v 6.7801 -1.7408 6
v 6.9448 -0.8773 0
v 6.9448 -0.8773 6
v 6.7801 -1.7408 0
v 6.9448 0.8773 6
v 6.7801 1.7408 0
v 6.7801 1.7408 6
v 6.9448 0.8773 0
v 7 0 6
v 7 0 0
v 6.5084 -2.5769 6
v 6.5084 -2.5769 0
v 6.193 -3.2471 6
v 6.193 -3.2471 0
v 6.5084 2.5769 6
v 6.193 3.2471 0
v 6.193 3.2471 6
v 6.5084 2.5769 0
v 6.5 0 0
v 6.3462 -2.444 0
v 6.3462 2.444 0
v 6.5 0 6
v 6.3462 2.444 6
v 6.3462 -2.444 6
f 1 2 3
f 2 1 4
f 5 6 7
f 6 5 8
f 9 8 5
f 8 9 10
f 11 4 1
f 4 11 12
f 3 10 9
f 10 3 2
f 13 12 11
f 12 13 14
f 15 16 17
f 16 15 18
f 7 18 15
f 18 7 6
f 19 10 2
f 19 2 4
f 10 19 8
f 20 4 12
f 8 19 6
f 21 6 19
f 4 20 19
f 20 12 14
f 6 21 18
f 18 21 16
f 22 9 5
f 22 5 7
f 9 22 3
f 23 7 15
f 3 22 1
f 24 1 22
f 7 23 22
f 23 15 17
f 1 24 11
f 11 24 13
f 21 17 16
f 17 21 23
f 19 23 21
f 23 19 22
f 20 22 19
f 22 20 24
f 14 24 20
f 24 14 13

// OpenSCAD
$fn = 50;


difference() {
	union() {
		cylinder(h = 6, r = 7.0000000000);
		translate(v = [-16.0000000000, 0, 0]) {
			cylinder(h = 6, r = 7.0000000000);
		}
	}
	union() {
		cylinder(h = 6, r = 3.2500000000);
		cylinder(h = 6, r = 1.8000000000);
		cylinder(h = 6, r = 1.8000000000);
		cylinder(h = 6, r = 1.8000000000);
		translate(v = [-20.5000000000, 0, 0]) {
			hull() {
				translate(v = [-3.7500000000, 0.0000000000, 0]) {
					cylinder(h = 6, r = 10.5000000000);
				}
				translate(v = [3.7500000000, 0.0000000000, 0]) {
					cylinder(h = 6, r = 10.5000000000);
				}
				translate(v = [-3.7500000000, -0.0000000000, 0]) {
					cylinder(h = 6, r = 10.5000000000);
				}
				translate(v = [3.7500000000, -0.0000000000, 0]) {
					cylinder(h = 6, r = 10.5000000000);
				}
			}
		}
		translate(v = [-13.0000000000, 0, 0.0000000000]) {
			cylinder(h = 6, r = 19.5000000000);
		}
	}
}
